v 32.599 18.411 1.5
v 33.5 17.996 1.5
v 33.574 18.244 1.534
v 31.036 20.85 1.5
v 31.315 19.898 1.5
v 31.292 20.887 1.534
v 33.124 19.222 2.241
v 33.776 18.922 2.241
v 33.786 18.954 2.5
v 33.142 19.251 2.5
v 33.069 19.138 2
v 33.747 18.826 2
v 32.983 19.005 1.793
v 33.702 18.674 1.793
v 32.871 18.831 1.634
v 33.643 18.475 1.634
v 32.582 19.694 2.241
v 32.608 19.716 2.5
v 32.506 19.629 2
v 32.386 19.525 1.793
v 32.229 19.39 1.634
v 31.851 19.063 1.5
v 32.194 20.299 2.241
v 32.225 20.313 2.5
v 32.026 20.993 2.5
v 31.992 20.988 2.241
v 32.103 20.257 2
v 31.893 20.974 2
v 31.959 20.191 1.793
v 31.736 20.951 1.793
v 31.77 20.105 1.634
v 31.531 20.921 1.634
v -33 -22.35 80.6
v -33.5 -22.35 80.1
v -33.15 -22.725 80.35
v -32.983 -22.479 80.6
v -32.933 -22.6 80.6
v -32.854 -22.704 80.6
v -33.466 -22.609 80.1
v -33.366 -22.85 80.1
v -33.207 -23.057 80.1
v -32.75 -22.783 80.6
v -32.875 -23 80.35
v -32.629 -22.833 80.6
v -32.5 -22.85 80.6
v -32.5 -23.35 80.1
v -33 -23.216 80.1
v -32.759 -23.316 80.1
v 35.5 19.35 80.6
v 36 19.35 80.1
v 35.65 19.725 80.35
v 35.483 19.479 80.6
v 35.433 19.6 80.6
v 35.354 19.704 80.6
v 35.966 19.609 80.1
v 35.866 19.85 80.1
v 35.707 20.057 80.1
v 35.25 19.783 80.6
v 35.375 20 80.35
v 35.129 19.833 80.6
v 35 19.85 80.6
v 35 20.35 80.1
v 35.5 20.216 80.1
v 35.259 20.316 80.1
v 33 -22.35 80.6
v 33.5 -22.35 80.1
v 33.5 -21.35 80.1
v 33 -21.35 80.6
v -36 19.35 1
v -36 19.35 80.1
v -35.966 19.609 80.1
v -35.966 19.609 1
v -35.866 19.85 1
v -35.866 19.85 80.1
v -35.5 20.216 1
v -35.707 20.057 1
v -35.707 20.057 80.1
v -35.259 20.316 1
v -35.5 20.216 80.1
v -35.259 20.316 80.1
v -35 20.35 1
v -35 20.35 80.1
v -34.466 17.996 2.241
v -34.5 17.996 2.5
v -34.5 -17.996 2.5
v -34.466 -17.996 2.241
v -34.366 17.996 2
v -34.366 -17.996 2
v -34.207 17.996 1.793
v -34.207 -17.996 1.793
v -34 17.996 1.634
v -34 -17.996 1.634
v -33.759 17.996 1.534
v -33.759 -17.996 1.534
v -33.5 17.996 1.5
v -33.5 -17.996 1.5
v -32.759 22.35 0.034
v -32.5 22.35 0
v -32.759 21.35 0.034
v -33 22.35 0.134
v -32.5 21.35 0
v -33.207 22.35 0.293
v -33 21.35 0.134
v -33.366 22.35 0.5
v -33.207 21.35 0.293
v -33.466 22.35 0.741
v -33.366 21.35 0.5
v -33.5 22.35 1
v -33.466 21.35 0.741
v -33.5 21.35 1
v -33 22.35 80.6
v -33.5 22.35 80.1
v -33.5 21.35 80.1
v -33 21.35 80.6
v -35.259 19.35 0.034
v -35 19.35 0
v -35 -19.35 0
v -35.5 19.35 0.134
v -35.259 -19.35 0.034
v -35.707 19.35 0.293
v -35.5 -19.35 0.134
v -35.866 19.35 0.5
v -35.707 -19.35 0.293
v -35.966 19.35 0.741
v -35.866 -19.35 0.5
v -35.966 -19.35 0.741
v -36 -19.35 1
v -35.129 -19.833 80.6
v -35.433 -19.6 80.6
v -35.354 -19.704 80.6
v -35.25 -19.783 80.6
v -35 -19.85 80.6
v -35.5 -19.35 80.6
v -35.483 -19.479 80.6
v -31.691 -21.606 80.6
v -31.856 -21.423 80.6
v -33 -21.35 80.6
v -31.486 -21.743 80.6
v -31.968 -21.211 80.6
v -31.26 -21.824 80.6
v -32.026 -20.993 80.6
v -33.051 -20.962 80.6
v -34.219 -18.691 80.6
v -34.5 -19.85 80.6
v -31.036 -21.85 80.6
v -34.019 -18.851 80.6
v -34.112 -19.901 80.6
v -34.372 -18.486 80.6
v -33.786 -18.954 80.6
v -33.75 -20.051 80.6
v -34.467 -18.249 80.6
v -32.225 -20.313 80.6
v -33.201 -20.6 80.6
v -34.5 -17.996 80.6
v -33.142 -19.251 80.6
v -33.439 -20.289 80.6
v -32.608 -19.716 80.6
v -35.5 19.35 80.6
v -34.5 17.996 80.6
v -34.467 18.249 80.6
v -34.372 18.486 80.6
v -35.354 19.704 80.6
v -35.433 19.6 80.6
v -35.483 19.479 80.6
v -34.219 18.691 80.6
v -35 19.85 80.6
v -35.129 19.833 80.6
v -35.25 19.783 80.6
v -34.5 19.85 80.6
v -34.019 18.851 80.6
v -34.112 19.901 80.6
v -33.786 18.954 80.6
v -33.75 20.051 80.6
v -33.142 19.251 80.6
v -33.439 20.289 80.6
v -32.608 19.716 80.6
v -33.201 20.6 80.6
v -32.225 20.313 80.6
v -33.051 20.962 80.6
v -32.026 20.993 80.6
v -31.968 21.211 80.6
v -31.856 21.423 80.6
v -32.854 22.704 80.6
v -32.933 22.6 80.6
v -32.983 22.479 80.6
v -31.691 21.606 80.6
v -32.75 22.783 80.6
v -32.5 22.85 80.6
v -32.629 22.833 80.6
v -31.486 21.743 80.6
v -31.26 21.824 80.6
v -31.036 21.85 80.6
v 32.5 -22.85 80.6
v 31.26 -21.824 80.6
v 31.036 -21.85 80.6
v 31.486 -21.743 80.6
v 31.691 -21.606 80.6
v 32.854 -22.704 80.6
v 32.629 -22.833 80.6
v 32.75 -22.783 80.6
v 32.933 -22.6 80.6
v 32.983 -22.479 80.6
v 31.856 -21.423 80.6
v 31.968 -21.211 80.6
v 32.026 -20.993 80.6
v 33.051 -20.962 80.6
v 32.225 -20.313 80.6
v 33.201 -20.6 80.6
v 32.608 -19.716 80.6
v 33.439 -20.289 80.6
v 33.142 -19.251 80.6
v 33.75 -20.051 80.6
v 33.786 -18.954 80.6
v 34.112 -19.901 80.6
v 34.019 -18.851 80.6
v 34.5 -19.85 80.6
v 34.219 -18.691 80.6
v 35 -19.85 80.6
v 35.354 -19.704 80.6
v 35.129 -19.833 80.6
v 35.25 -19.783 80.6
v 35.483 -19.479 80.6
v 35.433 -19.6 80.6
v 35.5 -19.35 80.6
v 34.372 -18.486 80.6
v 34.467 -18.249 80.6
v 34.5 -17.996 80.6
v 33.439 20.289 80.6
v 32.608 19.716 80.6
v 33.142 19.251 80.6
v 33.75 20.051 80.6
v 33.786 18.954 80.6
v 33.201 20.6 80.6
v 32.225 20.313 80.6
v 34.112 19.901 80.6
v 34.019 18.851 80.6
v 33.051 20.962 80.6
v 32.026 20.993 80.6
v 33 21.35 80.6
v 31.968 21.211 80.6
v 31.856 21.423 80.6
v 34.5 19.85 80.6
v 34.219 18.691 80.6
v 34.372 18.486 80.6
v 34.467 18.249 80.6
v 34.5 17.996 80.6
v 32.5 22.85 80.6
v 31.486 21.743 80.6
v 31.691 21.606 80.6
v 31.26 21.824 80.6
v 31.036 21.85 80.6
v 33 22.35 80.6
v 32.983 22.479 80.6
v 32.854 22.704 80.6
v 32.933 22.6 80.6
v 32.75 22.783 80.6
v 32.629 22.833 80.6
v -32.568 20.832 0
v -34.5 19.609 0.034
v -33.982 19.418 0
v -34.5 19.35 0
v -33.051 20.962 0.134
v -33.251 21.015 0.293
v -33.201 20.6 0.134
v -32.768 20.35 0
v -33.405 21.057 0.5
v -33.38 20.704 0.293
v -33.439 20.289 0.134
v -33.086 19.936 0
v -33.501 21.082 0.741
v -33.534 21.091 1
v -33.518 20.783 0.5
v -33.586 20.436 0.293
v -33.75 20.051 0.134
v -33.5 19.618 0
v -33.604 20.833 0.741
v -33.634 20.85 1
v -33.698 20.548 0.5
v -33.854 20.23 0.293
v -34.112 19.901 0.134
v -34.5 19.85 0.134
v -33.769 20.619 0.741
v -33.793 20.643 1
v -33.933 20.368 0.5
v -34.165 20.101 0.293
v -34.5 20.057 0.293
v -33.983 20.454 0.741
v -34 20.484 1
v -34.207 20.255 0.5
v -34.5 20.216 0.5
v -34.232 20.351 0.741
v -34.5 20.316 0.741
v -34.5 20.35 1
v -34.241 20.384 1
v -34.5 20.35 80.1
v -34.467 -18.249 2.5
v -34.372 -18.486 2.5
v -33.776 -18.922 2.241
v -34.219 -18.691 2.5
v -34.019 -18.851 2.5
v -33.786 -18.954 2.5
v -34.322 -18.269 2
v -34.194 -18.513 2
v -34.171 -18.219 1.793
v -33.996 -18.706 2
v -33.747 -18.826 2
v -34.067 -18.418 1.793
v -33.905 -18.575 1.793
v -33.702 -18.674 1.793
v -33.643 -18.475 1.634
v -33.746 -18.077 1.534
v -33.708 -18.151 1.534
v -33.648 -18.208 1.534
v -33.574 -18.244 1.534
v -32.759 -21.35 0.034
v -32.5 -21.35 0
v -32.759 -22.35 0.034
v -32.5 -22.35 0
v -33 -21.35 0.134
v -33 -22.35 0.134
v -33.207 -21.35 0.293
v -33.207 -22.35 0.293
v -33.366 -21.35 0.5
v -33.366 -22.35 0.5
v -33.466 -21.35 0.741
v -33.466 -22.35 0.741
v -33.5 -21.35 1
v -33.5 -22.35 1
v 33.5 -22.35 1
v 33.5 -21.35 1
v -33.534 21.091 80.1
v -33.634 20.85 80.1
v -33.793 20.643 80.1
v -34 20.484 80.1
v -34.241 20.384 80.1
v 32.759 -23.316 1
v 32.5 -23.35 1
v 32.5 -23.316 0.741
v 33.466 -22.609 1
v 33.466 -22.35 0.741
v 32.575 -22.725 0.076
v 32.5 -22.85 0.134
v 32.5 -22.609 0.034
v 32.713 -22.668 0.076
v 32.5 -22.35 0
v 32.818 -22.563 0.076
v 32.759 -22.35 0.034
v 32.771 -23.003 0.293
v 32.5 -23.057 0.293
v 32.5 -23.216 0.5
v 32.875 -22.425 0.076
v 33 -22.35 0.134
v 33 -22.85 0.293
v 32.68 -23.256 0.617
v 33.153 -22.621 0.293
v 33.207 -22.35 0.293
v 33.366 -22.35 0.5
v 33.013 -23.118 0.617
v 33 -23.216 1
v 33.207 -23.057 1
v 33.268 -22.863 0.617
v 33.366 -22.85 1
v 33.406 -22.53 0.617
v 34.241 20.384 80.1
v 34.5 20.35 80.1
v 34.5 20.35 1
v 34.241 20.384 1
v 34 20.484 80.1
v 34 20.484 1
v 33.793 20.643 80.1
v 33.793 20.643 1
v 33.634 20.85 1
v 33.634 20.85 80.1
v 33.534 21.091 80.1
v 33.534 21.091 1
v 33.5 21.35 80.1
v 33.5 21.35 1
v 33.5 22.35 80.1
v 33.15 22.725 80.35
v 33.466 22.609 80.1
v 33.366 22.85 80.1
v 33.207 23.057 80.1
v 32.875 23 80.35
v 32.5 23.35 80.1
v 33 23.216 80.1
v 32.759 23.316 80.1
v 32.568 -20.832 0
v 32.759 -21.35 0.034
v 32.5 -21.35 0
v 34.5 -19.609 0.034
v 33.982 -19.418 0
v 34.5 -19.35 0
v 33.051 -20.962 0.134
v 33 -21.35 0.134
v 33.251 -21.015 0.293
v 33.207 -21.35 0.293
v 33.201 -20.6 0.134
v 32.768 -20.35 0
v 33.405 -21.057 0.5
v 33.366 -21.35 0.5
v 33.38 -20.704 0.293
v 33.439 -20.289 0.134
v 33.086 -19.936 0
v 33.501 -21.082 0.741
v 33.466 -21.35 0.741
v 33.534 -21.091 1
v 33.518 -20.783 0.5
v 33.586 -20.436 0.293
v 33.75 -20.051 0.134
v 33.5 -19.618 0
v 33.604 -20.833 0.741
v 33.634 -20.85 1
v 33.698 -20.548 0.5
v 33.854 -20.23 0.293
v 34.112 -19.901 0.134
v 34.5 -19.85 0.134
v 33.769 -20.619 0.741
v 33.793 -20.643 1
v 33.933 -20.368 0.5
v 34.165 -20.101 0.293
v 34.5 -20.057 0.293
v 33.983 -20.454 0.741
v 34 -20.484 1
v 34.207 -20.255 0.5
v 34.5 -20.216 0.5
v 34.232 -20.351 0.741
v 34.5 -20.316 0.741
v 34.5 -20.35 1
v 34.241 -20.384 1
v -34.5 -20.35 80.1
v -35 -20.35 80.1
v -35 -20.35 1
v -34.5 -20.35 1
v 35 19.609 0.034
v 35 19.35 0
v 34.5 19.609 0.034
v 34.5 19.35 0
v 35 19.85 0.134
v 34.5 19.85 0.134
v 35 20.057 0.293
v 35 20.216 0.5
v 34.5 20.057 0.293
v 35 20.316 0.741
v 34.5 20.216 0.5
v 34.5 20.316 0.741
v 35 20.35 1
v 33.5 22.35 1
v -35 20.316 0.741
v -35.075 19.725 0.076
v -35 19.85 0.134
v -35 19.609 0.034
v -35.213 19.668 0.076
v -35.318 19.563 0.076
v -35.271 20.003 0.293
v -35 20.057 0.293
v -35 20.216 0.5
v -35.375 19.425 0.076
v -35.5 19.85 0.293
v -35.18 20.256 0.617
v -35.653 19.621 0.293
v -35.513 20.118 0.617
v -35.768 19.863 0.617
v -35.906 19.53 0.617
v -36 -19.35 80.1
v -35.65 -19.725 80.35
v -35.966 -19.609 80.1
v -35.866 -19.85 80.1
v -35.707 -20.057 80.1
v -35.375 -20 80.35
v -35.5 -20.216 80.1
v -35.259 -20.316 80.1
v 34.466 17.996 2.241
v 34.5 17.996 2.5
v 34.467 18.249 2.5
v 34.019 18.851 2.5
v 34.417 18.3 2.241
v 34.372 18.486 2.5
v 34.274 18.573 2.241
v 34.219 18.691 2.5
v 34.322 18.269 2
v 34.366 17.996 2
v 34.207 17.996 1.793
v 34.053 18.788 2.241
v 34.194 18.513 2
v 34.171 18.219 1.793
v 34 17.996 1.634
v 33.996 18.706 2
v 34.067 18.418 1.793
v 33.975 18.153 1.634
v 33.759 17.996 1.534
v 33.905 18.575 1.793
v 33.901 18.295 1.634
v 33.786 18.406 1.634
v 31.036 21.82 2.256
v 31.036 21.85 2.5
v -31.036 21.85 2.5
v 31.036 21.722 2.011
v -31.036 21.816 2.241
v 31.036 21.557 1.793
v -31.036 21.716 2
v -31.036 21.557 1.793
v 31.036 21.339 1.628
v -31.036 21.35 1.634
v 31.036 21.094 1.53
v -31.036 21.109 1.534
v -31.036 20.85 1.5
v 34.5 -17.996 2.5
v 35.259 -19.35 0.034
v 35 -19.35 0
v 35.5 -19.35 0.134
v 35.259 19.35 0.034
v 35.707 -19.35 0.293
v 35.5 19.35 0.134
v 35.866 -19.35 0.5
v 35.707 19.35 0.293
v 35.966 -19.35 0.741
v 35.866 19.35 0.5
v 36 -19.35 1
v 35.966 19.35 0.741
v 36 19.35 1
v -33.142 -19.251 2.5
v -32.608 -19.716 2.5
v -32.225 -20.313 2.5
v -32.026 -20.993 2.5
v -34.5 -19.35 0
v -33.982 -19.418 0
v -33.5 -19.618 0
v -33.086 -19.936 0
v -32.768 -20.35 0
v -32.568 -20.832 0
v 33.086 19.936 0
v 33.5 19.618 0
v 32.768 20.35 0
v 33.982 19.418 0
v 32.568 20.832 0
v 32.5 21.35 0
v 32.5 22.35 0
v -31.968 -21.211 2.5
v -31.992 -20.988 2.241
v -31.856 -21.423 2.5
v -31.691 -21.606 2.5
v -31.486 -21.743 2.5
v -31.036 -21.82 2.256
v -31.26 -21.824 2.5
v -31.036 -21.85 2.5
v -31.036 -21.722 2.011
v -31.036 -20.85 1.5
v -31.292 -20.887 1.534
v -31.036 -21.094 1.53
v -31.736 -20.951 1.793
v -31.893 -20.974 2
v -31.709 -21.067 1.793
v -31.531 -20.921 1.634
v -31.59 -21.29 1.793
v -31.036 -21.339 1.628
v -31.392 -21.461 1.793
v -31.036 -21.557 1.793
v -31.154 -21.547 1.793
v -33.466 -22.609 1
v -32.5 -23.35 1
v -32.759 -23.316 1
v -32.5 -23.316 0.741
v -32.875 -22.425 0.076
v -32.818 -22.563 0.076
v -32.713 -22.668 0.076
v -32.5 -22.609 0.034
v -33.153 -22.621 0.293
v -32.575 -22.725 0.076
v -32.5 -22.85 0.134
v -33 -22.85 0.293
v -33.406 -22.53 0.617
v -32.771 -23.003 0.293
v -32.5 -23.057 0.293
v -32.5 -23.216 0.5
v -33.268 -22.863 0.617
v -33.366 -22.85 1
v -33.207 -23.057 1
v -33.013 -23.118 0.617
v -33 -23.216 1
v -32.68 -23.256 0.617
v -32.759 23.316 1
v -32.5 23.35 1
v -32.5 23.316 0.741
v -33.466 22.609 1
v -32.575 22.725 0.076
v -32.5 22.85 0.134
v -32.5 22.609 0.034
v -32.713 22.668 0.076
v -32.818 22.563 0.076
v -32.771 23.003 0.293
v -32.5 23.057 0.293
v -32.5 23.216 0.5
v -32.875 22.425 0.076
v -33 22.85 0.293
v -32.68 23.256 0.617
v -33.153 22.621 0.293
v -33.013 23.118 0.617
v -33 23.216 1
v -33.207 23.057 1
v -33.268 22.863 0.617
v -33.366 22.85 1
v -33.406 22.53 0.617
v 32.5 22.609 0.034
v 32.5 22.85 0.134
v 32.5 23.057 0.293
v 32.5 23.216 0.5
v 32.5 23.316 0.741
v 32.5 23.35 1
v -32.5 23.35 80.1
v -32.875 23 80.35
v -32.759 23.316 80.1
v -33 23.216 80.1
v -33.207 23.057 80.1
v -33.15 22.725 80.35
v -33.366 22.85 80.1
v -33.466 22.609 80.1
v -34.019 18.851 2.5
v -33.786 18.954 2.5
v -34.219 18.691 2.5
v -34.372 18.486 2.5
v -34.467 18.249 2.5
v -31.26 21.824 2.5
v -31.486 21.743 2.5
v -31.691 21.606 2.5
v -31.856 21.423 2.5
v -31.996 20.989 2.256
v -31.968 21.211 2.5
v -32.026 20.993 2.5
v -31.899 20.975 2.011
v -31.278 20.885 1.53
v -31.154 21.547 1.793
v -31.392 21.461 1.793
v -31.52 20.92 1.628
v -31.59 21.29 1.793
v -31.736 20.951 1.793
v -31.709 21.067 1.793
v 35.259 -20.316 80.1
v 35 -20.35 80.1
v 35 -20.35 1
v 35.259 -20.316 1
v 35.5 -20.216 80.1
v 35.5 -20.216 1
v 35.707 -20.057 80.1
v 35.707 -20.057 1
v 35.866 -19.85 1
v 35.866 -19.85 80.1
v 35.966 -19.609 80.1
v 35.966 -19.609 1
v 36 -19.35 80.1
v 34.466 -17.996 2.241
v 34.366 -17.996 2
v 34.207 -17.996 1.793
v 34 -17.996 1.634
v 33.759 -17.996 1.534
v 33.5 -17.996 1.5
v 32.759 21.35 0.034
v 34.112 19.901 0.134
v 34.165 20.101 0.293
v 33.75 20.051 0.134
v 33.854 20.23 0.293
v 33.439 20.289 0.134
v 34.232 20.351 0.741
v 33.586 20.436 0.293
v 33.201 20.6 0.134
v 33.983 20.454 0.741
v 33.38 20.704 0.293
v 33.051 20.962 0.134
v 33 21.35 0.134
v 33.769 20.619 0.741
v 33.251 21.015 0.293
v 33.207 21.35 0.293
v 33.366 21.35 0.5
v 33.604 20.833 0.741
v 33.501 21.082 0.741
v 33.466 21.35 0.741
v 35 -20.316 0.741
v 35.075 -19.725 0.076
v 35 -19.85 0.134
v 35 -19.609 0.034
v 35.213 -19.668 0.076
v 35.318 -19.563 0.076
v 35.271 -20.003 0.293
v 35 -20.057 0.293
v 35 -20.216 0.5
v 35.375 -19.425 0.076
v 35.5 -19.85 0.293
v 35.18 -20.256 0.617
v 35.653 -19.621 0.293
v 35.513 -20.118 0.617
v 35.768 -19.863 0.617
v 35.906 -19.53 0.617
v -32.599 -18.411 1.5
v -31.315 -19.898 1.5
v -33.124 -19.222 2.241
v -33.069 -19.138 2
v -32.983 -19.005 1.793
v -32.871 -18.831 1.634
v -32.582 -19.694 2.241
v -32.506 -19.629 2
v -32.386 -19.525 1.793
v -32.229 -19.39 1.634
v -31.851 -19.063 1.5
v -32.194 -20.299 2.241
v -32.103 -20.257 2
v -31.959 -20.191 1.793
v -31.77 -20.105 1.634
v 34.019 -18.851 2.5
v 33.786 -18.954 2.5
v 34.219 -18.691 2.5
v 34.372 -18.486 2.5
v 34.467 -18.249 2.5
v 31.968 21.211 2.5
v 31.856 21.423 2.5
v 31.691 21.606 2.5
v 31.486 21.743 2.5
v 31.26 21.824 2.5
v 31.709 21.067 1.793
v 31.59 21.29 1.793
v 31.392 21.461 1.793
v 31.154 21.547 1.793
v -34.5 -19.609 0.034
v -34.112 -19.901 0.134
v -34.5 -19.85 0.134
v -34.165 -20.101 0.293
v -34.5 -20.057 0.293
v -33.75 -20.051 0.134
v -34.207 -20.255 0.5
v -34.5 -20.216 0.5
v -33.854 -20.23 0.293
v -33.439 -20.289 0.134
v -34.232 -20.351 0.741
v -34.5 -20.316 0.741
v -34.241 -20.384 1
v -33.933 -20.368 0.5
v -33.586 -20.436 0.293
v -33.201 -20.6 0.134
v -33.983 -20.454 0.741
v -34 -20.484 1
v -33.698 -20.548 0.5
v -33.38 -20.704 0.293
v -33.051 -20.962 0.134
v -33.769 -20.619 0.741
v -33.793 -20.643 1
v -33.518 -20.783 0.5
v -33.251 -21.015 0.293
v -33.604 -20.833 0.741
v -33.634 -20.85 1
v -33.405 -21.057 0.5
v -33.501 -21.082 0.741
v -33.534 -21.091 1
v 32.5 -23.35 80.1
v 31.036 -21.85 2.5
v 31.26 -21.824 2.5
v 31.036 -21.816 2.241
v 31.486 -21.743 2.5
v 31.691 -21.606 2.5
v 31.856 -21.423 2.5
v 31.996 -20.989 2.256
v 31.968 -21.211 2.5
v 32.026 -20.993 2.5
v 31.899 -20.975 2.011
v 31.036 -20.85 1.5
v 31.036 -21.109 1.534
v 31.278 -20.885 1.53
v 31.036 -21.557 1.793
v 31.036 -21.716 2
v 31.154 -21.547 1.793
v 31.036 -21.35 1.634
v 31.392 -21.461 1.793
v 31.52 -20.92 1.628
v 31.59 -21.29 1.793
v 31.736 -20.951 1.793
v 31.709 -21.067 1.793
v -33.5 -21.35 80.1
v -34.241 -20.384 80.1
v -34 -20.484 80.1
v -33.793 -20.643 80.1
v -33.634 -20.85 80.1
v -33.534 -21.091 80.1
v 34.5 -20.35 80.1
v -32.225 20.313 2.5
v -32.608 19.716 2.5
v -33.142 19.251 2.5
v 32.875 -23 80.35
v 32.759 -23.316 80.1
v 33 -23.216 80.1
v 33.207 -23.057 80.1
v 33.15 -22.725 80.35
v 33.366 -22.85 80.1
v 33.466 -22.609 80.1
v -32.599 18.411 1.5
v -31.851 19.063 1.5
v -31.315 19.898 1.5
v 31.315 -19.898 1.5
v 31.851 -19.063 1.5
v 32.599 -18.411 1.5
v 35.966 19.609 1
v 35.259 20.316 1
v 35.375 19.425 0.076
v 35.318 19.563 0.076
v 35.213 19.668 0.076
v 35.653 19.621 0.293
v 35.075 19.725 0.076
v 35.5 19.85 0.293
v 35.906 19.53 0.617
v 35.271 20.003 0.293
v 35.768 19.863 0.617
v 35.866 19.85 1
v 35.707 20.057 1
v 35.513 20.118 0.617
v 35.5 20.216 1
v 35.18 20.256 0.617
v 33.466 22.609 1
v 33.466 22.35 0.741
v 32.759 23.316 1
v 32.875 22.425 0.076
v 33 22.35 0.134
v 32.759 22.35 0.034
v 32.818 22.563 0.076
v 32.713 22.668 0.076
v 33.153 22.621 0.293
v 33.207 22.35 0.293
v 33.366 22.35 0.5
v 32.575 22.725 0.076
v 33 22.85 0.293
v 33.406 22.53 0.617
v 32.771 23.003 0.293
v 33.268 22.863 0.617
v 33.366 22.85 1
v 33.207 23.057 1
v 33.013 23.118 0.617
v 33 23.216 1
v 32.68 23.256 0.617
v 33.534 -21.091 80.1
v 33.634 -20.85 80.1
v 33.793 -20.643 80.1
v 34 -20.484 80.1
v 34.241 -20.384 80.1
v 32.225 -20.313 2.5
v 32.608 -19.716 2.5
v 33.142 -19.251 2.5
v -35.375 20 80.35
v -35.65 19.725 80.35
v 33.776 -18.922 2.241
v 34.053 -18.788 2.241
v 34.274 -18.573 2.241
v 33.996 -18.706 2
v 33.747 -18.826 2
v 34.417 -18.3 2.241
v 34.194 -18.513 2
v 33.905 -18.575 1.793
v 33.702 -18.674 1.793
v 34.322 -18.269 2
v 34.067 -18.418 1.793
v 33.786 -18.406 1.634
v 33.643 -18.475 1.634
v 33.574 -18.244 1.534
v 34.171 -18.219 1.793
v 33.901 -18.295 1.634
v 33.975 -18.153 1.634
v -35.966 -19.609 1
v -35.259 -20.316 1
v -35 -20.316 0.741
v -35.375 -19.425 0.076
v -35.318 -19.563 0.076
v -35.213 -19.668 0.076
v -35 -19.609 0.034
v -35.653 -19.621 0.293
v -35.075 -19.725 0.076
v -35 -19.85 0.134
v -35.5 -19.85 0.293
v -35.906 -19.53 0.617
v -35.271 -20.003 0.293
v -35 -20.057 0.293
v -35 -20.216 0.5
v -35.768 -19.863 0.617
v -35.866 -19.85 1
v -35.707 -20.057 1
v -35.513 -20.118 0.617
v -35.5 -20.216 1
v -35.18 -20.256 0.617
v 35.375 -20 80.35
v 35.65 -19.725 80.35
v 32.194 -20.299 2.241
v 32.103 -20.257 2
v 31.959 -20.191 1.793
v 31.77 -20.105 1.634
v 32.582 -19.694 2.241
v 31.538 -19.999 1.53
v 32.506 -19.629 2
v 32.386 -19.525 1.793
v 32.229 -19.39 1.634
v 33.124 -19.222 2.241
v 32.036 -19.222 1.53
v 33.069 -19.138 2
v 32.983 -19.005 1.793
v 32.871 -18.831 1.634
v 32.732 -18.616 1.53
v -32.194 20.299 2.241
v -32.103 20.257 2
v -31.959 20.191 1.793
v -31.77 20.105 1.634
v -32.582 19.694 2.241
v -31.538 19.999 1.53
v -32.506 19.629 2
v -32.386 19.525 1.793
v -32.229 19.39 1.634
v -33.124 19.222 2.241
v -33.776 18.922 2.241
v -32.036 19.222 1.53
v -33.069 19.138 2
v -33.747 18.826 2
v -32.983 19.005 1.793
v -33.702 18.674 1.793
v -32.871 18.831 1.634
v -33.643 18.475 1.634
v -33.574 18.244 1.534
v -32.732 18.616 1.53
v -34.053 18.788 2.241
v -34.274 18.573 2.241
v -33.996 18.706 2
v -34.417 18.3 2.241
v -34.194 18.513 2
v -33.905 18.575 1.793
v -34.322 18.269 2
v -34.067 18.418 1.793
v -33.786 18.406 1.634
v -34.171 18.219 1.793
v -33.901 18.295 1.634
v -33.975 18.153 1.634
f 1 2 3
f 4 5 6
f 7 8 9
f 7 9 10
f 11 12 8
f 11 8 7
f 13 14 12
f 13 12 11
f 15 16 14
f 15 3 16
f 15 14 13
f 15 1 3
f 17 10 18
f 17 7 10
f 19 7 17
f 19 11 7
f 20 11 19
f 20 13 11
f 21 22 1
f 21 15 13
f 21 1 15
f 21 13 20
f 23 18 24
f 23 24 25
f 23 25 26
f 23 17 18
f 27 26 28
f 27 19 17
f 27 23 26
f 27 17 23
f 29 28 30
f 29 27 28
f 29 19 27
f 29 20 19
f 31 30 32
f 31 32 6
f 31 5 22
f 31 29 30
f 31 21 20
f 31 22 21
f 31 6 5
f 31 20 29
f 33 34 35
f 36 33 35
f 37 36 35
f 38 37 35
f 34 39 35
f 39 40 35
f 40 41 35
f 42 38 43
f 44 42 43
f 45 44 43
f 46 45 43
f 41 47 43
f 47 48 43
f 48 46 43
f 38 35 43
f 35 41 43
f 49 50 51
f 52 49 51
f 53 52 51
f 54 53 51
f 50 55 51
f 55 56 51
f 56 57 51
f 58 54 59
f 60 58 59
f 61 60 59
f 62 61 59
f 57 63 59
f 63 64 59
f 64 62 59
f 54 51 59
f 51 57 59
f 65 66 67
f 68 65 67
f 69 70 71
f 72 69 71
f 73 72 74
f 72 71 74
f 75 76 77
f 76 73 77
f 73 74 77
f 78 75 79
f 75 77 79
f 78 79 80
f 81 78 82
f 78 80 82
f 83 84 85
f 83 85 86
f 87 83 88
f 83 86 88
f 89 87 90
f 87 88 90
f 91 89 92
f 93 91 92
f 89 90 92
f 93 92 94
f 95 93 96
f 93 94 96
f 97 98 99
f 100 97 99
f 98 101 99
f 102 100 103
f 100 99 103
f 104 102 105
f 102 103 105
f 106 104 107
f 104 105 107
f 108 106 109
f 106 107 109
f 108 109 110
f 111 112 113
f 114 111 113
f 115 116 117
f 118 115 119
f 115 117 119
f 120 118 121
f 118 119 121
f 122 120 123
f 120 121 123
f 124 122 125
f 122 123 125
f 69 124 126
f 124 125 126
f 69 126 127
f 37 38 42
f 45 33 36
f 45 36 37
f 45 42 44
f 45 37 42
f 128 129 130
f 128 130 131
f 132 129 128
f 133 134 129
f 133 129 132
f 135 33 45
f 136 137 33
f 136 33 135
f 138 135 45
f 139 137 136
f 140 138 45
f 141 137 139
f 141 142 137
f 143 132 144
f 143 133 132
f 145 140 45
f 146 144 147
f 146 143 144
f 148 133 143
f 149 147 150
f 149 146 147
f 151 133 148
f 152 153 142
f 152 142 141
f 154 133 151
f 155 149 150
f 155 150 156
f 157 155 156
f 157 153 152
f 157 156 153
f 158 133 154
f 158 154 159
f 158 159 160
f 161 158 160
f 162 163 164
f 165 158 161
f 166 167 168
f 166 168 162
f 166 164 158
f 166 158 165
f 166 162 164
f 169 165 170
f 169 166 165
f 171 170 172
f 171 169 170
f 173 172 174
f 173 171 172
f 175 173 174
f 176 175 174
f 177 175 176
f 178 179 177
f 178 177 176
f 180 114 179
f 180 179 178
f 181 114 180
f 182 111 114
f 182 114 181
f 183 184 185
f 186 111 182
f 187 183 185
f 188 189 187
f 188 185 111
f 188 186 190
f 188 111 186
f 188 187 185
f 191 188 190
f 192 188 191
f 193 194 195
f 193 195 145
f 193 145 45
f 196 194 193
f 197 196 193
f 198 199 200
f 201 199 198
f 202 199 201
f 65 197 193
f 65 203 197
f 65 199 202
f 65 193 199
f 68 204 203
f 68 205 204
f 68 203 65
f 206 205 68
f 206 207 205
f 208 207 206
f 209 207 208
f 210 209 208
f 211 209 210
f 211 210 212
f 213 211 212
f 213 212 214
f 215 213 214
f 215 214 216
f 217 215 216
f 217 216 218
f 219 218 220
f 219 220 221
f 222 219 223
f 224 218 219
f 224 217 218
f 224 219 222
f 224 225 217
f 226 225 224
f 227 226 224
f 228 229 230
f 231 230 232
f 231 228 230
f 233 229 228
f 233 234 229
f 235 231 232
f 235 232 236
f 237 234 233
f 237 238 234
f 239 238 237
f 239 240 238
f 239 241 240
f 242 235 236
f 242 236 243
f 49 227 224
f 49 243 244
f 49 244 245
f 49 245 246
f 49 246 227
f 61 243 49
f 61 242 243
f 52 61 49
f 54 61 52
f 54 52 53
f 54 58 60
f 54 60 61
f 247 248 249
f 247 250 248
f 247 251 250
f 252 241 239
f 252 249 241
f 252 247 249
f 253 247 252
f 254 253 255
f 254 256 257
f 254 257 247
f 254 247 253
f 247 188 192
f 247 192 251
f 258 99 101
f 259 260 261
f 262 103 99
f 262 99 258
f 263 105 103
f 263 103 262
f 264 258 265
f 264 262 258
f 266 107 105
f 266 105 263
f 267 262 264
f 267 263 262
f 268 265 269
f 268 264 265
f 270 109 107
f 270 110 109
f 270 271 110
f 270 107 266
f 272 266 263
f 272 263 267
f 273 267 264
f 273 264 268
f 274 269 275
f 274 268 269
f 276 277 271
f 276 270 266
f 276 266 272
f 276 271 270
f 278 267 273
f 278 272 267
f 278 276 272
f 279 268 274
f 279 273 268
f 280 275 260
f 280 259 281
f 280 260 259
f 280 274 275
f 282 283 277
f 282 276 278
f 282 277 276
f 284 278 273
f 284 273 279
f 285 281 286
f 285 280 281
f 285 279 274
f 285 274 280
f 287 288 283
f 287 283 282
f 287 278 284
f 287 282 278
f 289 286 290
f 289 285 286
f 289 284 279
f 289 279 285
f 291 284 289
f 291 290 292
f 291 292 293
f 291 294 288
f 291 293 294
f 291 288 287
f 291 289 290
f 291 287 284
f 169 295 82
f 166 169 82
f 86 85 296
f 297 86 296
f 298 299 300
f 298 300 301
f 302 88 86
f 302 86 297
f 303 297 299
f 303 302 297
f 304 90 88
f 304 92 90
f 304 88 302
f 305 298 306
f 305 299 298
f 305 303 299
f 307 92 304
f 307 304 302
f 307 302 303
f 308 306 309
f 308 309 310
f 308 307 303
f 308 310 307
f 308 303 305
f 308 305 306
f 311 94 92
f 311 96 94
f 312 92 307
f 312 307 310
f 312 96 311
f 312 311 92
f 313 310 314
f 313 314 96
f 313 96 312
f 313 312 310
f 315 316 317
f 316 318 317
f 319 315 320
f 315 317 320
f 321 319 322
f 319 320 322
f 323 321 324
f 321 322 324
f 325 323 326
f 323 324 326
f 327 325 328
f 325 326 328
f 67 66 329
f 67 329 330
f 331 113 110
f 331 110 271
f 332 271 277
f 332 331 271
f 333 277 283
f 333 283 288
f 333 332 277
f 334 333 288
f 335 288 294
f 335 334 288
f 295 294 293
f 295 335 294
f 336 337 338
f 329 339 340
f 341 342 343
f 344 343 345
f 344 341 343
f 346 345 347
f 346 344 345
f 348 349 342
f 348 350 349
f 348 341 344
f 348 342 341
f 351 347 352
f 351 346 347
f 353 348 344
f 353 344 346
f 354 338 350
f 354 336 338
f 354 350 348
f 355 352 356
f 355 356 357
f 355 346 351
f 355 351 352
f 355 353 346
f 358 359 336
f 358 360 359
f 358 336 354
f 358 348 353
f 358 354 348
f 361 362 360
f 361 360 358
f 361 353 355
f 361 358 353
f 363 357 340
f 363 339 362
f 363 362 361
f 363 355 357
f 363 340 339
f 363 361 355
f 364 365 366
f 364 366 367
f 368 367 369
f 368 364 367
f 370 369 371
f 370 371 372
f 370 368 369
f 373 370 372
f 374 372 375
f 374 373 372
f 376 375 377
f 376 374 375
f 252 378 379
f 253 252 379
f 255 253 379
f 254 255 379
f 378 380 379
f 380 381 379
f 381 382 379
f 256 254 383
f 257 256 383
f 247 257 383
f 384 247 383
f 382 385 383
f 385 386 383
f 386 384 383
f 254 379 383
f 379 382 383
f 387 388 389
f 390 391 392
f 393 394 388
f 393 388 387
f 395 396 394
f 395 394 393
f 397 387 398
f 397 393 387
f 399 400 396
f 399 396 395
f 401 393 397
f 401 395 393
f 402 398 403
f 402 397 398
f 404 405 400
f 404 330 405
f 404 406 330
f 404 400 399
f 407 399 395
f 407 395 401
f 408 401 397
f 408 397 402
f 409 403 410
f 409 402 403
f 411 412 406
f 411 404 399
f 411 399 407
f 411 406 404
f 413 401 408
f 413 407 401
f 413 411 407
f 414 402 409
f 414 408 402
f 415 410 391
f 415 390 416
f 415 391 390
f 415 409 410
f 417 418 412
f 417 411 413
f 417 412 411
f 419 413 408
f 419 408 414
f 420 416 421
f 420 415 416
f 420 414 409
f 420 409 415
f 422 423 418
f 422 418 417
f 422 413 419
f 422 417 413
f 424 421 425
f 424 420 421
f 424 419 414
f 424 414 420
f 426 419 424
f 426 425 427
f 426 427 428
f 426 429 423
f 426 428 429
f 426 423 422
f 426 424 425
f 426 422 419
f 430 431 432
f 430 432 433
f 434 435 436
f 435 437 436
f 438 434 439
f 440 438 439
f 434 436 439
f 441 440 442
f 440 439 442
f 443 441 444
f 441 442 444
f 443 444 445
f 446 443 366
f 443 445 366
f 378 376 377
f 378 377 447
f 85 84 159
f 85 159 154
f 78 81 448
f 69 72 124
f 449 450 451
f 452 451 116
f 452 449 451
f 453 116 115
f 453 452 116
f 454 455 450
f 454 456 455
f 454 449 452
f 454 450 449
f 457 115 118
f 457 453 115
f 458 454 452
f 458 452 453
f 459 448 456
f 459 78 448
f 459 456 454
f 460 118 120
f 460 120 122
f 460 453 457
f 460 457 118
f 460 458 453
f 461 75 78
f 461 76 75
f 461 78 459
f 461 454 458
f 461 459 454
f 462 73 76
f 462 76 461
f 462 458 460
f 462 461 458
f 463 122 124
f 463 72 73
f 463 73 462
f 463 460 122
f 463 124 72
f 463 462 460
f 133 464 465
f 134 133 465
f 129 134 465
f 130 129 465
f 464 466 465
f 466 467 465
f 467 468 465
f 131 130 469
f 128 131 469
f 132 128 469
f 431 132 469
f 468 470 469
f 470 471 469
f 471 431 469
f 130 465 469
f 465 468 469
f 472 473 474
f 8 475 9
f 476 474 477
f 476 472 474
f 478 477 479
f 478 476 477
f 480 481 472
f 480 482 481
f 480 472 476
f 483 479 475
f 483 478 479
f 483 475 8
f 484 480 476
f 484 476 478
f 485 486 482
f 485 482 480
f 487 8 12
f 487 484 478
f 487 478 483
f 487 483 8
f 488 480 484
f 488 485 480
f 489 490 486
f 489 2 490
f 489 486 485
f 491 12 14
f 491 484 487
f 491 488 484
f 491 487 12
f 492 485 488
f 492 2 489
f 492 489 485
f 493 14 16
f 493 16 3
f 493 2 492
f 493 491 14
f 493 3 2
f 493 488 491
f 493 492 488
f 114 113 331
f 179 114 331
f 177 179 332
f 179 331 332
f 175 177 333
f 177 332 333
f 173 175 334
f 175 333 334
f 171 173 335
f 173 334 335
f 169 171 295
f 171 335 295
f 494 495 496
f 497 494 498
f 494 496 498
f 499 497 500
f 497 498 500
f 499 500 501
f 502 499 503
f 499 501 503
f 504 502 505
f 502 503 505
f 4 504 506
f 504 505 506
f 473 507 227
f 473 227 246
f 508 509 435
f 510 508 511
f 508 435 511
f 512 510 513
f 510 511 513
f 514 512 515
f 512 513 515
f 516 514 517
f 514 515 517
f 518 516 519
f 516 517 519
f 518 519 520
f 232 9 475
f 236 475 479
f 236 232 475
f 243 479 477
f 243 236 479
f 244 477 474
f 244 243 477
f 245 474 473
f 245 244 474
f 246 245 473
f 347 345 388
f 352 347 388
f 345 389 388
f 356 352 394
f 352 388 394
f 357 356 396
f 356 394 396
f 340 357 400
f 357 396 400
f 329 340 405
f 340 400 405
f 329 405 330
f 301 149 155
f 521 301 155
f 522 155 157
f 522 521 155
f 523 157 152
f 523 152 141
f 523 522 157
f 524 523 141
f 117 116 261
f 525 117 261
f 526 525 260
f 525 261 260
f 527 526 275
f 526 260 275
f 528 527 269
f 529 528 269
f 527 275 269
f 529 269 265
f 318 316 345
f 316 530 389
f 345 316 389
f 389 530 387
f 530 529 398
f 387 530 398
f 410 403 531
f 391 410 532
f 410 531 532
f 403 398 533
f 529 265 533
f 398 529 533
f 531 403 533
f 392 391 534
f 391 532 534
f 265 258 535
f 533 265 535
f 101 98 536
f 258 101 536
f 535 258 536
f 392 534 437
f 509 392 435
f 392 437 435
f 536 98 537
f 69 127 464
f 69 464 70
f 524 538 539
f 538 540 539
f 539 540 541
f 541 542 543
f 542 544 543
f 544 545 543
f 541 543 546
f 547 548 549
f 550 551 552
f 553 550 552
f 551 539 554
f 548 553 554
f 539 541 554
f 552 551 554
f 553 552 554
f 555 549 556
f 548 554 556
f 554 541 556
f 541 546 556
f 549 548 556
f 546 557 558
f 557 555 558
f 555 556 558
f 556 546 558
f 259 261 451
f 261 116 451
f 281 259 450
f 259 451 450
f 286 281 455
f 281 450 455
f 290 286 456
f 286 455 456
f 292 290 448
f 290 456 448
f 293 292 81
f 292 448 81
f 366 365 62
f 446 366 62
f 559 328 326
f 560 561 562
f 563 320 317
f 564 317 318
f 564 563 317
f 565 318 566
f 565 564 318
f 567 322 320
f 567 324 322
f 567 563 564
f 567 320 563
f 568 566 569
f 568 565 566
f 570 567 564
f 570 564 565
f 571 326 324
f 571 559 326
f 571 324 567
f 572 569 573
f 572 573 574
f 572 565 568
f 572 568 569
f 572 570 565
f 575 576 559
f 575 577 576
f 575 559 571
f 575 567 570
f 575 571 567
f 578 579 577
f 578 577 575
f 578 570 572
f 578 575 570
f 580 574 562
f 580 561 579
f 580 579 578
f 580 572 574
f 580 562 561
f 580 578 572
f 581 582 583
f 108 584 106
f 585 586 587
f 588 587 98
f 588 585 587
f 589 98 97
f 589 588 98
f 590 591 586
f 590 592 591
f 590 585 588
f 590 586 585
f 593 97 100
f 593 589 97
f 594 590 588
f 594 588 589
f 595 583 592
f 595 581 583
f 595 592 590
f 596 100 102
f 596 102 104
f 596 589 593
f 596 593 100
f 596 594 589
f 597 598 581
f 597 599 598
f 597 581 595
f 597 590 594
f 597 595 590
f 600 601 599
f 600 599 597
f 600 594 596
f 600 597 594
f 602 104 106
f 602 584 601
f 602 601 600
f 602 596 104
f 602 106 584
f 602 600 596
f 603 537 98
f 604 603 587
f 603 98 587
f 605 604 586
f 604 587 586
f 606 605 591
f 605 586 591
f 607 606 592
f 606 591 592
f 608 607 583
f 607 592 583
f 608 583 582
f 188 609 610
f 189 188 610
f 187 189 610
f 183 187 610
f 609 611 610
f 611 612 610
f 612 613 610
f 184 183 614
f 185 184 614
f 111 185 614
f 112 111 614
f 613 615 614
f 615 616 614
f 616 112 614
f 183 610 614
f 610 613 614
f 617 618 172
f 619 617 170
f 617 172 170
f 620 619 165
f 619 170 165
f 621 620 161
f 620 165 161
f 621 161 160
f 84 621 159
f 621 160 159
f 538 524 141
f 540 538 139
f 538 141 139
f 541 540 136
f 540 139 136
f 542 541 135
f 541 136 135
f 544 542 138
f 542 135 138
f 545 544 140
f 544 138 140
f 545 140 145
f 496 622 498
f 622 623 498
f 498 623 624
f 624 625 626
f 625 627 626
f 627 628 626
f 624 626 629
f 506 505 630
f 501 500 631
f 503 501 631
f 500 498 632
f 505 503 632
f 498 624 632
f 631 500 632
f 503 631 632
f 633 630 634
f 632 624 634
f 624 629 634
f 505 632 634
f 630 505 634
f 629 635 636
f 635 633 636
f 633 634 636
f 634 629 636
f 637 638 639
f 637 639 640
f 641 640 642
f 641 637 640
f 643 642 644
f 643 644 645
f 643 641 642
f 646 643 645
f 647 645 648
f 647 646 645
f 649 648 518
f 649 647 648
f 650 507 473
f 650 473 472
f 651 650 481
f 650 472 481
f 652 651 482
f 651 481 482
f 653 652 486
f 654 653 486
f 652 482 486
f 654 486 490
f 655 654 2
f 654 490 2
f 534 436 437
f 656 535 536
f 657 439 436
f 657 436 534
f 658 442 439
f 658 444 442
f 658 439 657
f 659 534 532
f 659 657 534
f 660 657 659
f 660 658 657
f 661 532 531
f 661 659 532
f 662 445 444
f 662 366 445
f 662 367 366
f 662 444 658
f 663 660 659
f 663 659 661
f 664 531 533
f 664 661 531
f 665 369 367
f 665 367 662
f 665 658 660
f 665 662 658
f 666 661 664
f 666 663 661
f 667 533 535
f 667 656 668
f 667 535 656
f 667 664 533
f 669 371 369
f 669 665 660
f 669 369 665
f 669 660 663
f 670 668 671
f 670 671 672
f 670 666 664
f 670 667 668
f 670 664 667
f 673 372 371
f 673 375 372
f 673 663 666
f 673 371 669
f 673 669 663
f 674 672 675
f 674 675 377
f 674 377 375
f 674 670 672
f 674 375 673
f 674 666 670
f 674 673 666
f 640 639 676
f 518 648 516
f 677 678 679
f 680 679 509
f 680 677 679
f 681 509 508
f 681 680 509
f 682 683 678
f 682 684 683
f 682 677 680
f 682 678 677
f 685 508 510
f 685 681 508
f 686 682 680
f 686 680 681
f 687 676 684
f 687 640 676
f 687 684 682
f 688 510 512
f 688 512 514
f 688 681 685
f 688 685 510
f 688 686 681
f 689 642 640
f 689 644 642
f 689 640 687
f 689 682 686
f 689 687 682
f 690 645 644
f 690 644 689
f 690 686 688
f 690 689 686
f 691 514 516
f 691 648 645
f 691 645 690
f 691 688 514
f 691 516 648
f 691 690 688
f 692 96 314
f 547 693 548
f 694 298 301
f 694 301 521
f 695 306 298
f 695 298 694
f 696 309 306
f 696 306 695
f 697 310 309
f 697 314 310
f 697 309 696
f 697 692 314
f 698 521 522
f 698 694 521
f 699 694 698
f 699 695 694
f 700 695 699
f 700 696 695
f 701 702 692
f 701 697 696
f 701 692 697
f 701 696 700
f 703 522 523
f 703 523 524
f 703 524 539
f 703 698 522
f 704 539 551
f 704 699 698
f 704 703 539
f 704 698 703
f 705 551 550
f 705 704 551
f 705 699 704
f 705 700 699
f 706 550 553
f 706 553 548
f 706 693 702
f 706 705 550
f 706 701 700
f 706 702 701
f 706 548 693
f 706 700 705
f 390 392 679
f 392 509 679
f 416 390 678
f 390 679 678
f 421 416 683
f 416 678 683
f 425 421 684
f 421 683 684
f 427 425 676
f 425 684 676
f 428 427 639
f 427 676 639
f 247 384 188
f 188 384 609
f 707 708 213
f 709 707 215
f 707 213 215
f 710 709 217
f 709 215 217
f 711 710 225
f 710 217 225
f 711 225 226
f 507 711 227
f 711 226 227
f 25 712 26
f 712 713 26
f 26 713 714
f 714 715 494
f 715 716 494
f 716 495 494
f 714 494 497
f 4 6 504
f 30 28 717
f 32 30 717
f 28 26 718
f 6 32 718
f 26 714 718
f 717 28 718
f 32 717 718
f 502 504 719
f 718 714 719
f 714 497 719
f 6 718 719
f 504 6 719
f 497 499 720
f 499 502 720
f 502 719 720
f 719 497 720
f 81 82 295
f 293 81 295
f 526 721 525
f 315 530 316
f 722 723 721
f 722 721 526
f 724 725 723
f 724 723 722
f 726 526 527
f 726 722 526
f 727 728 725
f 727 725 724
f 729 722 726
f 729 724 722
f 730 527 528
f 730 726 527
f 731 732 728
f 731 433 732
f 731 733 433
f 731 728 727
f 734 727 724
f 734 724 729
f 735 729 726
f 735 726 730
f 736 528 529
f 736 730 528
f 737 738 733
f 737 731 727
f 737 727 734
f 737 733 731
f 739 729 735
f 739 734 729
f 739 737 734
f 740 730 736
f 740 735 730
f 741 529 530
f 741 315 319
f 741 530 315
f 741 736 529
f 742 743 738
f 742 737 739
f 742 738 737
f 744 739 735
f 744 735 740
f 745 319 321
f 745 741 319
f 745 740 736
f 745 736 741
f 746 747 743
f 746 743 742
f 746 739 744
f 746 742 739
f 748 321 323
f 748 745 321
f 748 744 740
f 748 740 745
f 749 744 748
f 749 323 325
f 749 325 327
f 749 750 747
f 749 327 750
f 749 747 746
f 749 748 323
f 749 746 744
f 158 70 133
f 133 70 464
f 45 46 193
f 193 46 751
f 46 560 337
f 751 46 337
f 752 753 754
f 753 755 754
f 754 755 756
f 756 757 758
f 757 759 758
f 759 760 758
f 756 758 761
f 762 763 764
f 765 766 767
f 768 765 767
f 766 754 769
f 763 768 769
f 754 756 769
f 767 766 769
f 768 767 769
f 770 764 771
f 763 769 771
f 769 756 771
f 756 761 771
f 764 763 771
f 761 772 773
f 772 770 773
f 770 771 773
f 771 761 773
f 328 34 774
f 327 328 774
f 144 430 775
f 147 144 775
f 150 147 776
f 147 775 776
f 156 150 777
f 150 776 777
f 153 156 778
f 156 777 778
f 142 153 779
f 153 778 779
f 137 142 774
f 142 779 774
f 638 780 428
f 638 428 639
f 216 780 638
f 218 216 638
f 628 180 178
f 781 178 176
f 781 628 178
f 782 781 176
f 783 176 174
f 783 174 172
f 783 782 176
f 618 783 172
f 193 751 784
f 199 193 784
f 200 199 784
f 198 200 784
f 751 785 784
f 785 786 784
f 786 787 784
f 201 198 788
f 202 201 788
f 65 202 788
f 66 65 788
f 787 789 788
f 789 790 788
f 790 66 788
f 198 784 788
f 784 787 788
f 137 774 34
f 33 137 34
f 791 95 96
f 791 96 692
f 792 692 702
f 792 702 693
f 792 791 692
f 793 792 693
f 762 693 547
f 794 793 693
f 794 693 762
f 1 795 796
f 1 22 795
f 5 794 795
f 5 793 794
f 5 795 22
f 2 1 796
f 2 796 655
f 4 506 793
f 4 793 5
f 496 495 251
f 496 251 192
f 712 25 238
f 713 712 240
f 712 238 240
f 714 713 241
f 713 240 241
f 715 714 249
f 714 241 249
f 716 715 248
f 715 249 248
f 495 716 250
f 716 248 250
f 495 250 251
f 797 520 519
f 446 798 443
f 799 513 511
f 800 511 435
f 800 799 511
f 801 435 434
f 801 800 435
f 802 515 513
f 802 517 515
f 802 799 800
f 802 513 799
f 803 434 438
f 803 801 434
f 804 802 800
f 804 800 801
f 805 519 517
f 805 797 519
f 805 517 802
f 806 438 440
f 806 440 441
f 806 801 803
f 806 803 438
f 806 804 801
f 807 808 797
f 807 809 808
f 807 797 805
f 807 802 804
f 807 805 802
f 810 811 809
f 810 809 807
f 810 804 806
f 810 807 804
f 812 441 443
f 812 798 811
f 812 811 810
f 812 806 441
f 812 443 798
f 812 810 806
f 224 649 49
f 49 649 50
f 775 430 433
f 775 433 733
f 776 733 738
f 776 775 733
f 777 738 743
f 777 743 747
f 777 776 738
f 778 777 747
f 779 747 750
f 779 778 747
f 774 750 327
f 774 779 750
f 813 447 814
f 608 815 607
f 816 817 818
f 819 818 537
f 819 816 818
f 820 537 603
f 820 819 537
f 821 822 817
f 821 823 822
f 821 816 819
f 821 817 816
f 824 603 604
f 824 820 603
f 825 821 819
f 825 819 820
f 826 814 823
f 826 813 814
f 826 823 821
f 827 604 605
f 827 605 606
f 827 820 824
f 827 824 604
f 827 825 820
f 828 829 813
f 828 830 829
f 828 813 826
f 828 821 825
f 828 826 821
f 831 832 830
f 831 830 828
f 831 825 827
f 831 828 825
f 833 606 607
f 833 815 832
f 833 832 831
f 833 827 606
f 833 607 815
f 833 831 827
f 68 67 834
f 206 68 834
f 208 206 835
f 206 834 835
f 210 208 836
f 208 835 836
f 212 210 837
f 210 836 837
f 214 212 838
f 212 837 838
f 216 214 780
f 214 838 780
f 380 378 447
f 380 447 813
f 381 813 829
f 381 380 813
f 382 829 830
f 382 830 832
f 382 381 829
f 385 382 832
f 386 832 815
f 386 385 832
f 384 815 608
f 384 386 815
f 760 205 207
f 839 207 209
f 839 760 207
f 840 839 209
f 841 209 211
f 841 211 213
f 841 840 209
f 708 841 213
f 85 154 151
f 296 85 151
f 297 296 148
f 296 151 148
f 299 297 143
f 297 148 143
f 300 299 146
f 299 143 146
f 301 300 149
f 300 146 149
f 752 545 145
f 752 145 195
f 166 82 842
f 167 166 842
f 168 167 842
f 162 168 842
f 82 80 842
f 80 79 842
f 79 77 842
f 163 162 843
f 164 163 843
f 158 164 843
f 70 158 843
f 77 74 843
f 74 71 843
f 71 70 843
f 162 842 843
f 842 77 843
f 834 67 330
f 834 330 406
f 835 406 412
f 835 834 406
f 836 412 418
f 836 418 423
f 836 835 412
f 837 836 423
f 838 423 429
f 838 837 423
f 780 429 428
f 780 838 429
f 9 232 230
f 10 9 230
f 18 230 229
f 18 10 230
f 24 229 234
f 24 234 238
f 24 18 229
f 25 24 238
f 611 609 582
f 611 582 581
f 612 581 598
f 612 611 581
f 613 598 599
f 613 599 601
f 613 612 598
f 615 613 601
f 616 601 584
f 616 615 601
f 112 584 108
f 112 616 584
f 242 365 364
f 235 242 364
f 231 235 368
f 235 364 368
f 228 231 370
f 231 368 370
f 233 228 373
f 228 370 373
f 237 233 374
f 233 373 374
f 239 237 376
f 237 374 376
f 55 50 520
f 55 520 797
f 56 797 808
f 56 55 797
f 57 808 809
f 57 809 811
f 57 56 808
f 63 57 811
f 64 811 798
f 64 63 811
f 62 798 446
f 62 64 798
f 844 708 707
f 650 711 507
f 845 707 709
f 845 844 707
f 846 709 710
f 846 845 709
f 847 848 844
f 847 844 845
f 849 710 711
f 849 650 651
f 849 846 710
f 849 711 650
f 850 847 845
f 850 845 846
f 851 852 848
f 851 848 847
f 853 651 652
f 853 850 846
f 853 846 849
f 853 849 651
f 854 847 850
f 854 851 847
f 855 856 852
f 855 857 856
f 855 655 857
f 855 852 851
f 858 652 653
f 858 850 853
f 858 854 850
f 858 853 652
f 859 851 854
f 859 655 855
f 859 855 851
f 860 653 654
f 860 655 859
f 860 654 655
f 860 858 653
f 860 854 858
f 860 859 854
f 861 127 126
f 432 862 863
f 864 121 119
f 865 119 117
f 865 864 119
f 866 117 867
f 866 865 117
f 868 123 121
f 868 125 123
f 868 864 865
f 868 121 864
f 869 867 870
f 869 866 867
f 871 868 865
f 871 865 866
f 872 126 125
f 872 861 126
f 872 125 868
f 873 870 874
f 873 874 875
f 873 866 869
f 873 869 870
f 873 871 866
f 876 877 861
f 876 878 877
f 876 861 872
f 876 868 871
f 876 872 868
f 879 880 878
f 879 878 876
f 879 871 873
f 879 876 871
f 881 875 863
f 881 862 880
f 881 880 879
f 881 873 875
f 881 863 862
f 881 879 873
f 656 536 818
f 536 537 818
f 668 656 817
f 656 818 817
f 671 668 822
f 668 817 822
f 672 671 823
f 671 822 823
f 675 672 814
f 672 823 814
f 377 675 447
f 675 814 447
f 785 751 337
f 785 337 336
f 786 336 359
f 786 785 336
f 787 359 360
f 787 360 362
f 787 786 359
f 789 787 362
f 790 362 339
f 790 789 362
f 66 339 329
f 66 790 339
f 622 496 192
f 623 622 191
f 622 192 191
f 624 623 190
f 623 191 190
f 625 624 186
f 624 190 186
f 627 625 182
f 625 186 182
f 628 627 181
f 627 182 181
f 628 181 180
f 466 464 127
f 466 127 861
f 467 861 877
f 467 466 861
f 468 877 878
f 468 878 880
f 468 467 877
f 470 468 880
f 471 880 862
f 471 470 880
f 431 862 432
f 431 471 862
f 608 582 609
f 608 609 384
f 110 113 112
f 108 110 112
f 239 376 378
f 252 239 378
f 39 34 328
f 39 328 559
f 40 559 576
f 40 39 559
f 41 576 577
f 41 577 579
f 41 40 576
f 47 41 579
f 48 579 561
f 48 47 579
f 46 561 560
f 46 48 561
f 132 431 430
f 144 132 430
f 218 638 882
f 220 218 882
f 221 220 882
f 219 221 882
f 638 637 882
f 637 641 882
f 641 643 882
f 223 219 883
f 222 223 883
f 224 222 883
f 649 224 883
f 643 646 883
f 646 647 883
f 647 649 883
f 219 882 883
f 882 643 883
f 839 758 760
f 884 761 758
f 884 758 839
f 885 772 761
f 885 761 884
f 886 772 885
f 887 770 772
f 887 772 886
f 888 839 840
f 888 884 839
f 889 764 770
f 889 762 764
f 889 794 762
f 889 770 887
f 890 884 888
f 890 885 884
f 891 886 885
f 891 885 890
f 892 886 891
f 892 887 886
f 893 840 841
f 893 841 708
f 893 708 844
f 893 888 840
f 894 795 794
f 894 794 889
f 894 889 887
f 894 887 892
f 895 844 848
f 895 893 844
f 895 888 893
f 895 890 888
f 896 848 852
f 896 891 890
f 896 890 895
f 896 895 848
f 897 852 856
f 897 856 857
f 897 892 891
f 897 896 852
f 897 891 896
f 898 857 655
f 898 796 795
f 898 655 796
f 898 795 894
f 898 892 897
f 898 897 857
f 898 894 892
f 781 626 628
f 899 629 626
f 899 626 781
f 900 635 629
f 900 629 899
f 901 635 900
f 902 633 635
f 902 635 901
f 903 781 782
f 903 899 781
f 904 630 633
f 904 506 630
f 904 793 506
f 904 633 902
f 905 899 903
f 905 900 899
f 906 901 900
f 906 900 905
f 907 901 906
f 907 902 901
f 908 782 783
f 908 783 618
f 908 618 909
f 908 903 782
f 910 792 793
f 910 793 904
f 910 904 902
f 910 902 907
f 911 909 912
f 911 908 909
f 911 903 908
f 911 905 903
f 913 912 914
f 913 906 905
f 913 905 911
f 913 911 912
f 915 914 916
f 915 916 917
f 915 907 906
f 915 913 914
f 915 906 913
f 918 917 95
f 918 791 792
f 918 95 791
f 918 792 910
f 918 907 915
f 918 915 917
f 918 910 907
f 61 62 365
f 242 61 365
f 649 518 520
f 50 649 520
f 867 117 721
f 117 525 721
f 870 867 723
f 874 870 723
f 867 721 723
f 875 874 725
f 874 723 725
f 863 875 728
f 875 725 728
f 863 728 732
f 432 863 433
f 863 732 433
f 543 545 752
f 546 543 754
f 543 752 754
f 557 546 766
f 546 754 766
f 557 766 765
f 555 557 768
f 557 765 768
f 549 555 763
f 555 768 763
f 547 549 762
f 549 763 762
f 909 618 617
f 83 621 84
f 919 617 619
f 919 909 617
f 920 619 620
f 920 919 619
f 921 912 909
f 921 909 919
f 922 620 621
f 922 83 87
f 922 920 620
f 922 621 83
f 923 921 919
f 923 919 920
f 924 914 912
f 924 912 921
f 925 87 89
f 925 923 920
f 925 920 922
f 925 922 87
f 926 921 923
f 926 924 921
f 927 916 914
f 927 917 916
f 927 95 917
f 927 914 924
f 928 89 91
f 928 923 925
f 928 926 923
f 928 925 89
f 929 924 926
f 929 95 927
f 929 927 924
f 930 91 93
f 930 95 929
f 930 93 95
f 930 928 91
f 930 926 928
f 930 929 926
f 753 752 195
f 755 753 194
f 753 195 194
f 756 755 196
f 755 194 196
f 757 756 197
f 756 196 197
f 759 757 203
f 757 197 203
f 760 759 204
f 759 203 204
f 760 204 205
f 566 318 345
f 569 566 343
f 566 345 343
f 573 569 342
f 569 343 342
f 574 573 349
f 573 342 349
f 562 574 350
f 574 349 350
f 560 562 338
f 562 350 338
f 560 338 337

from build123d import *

# Parameters (mm, degrees)
SKETCH_1_W      = 72
SKETCH_1_H      = 40.7
SKETCH_1_W_2    = 67
SKETCH_1_H_2    = 46.7
EXTRUDE_2_DEPTH = 80.6
FILLET_3_R      = 1
SHELL_START     = 1.5
SHELL_2_DEPTH   = 79.1
FILLET_4_R      = 1
FILLET_5_R      = 1
CHAMFER_1_SIZE  = 0.5
FILLET_6_R      = 1


# Read off the part's stored shape, not the designer's step: 抽壳2
with BuildPart() as part:
    # 草图1 → 凸台-拉伸2 (new body)
    with BuildSketch(Plane.XY):
        Rectangle(SKETCH_1_W, SKETCH_1_H)
        Rectangle(SKETCH_1_W_2, SKETCH_1_H_2)
    extrude(amount=EXTRUDE_2_DEPTH)

    # 圆角3
    fillet_3_edges = [part.edges().sort_by_distance(p)[0] for p in [
        (33.5, -20.35, 40.3),
        (-33.5, -20.35, 40.3),
        (-33.5, -23.35, 40.3),
        (33.5, -23.35, 40.3),
        (-36, -20.35, 40.3),
        (36, -20.35, 40.3),
        (36, 20.35, 40.3),
        (-36, 20.35, 40.3),
        (33.5, 20.35, 40.3),
        (-33.5, 20.35, 40.3),
        (-33.5, 23.35, 40.3),
        (33.5, 23.35, 40.3),
    ]]
    fillet(fillet_3_edges, radius=FILLET_3_R)

    # 抽壳2 outline → 抽壳2 (cut)
    with BuildSketch(Plane.XY.offset(SHELL_START)):
        with BuildLine():
            ThreePointArc((34.5, 18.85), (32.732233047, 19.582233047), (32, 21.35))
            Line((32, 21.35), (32, 21.85))
            Line((32, 21.85), (-32, 21.85))
            Line((-32, 21.85), (-32, 21.35))
            ThreePointArc((-32, 21.35), (-32.732233047, 19.582233047), (-34.5, 18.85))
            Line((-34.5, 18.85), (-34.5, -18.85))
            ThreePointArc((-34.5, -18.85), (-32.732233047, -19.582233047), (-32, -21.35))
            Line((-32, -21.35), (-32, -21.85))
            Line((-32, -21.85), (32, -21.85))
            Line((32, -21.85), (32, -21.35))
            ThreePointArc((32, -21.35), (32.732233047, -19.582233047), (34.5, -18.85))
            Line((34.5, -18.85), (34.5, 18.85))
        make_face()
    extrude(amount=SHELL_2_DEPTH, mode=Mode.SUBTRACT)

    # 圆角4
    fillet_4_edges = [part.edges().sort_by_distance(p)[0] for p in [
        (33.5, 21.85, 0),
        (34.75, 20.35, 0),
        (36, 0, 0),
        (34.75, -20.35, 0),
        (33.5, -21.85, 0),
        (0, -23.35, 0),
        (-33.5, -21.85, 0),
        (-34.75, -20.35, 0),
        (-36, 0, 0),
        (-34.75, 20.35, 0),
        (-33.5, 21.85, 0),
        (0, 23.35, 0),
        (35.707106781, -20.057106781, 0),
        (33.207106781, 23.057106781, 0),
        (-33.207106781, 23.057106781, 0),
        (-35.707106781, 20.057106781, 0),
        (-35.707106781, -20.057106781, 0),
        (-33.207106781, -23.057106781, 0),
        (33.207106781, -23.057106781, 0),
        (35.707106781, 20.057106781, 0),
        (33.792893219, 20.642893219, 0),
        (33.792893219, -20.642893219, 0),
        (-33.792893219, -20.642893219, 0),
        (-33.792893219, 20.642893219, 0),
    ]]
    fillet(fillet_4_edges, radius=FILLET_4_R)

    # 圆角5
    fillet_5_edges = [part.edges().sort_by_distance(p)[0] for p in [
        (34.5, 18.85, 41.05),
        (32, 21.85, 41.05),
        (32, 21.35, 41.05),
        (32, -21.85, 41.05),
        (32, -21.35, 41.05),
        (-32, 21.85, 41.05),
        (-32, 21.35, 41.05),
        (-32, -21.35, 41.05),
        (-32, -21.85, 41.05),
        (-34.5, 18.85, 41.05),
        (34.5, -18.85, 41.05),
        (-34.5, -18.85, 41.05),
    ]]
    fillet(fillet_5_edges, radius=FILLET_5_R)

    # 倒角1
    chamfer_1_edges = [part.edges().sort_by_distance(p)[0] for p in [
        (33.5, 21.85, 80.6),
        (34.75, 20.35, 80.6),
        (36, 0, 80.6),
        (0, 23.35, 80.6),
        (-33.5, 21.85, 80.6),
        (-34.75, 20.35, 80.6),
        (-36, 0, 80.6),
        (-34.75, -20.35, 80.6),
        (-33.5, -21.85, 80.6),
        (0, -23.35, 80.6),
        (33.5, -21.85, 80.6),
        (34.75, -20.35, 80.6),
        (35.707106781, -20.057106781, 80.6),
        (33.207106781, 23.057106781, 80.6),
        (-33.207106781, 23.057106781, 80.6),
        (-35.707106781, 20.057106781, 80.6),
        (-35.707106781, -20.057106781, 80.6),
        (-33.207106781, -23.057106781, 80.6),
        (33.207106781, -23.057106781, 80.6),
        (35.707106781, 20.057106781, 80.6),
        (33.792893219, 20.642893219, 80.6),
        (33.792893219, -20.642893219, 80.6),
        (-33.792893219, -20.642893219, 80.6),
        (-33.792893219, 20.642893219, 80.6),
    ]]
    chamfer(chamfer_1_edges, length=CHAMFER_1_SIZE)

    # 圆角6
    fillet_6_edges = [part.edges().sort_by_distance(p)[0] for p in [
        (32.607678605, 19.716255915, 1.5),
        (34.5, 0, 1.5),
        (0, 21.85, 1.5),
        (-32.607678605, 19.716255915, 1.5),
        (-34.5, 0, 1.5),
        (-32.607678605, -19.716255915, 1.5),
        (0, -21.85, 1.5),
        (32.607678605, -19.716255915, 1.5),
        (-34.301783726, -18.593512338, 1.5),
        (34.301783726, -18.593512338, 1.5),
        (31.690552056, -21.605928946, 1.5),
        (-31.690552056, -21.605928946, 1.5),
        (-34.301783726, 18.593512338, 1.5),
        (-31.690552056, 21.605928946, 1.5),
        (31.690552056, 21.605928946, 1.5),
        (34.301783726, 18.593512338, 1.5),
    ]]
    fillet(fillet_6_edges, radius=FILLET_6_R - 0.0001)  # a hair under: the kernel refuses the full size


solid = part.part
